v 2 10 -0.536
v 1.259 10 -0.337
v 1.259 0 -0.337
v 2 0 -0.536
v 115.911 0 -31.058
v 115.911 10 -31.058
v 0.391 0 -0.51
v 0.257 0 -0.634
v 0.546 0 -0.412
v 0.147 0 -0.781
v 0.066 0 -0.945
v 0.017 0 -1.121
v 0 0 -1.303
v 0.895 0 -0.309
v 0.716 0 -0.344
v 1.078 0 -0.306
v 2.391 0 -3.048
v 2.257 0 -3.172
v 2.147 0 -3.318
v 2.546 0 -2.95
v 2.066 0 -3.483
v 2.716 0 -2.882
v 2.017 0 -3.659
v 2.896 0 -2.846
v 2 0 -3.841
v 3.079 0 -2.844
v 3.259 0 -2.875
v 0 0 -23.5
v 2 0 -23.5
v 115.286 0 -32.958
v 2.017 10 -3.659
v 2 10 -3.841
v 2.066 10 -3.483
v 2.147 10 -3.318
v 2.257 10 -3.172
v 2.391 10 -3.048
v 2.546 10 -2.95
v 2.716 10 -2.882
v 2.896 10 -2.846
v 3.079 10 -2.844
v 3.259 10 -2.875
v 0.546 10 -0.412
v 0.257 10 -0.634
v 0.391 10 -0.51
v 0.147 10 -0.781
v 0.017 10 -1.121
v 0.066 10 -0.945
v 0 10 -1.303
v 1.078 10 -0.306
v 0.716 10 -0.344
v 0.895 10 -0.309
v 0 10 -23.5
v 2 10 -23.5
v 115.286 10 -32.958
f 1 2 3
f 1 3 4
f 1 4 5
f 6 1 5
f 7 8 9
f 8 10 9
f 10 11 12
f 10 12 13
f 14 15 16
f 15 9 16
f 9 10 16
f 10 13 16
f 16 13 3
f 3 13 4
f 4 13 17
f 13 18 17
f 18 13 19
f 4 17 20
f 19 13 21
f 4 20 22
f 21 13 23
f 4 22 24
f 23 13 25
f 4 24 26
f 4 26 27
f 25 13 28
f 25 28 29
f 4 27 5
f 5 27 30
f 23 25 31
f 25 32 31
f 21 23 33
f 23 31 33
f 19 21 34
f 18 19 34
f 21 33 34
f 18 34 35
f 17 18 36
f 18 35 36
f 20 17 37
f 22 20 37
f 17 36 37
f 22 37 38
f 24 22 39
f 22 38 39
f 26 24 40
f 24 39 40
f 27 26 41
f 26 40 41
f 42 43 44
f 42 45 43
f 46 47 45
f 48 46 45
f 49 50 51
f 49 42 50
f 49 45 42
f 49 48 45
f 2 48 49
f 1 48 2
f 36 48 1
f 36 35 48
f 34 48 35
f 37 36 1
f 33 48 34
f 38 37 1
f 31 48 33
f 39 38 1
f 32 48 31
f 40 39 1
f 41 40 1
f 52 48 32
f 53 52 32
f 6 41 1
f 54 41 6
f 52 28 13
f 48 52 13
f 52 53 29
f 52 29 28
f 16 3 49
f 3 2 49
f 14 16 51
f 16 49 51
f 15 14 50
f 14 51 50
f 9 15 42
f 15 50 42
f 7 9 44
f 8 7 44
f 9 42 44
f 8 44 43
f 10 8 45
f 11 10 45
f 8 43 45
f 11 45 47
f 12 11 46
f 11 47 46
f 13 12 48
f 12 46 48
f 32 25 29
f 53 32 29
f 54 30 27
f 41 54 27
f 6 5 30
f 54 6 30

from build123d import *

# Parameters (mm, degrees)
BOSS_EXTRUDE1_DEPTH = 10
BOSS_EXTRUDE2_DEPTH = 10
FILLET1_R           = 1


with BuildPart() as part:
    # Sketch1 → Boss-Extrude1 (new body)
    with BuildSketch(Plane(origin=(0, 0, 0), x_dir=(1, 0, 0), z_dir=(0, 1, 0))):
        Polygon((0, 0), (2, 0.535898385), (2, 23.5), (0, 23.5), align=None)
    extrude(amount=BOSS_EXTRUDE1_DEPTH)

    # Sketch3 → Boss-Extrude2 (add)
    with BuildSketch(Plane.XZ):
        Polygon((0, 0), (115.911099155, -31.058285412), (115.285791267, -32.958019616), (0, -2), align=None)
    extrude(amount=-BOSS_EXTRUDE2_DEPTH)

    # Fillet1
    fillet1_edges = [part.edges().sort_by_distance(p)[0] for p in [
        (2, 5, -2.537065657),
        (0, 5, 0),
    ]]
    fillet(fillet1_edges, radius=FILLET1_R)


solid = part.part
